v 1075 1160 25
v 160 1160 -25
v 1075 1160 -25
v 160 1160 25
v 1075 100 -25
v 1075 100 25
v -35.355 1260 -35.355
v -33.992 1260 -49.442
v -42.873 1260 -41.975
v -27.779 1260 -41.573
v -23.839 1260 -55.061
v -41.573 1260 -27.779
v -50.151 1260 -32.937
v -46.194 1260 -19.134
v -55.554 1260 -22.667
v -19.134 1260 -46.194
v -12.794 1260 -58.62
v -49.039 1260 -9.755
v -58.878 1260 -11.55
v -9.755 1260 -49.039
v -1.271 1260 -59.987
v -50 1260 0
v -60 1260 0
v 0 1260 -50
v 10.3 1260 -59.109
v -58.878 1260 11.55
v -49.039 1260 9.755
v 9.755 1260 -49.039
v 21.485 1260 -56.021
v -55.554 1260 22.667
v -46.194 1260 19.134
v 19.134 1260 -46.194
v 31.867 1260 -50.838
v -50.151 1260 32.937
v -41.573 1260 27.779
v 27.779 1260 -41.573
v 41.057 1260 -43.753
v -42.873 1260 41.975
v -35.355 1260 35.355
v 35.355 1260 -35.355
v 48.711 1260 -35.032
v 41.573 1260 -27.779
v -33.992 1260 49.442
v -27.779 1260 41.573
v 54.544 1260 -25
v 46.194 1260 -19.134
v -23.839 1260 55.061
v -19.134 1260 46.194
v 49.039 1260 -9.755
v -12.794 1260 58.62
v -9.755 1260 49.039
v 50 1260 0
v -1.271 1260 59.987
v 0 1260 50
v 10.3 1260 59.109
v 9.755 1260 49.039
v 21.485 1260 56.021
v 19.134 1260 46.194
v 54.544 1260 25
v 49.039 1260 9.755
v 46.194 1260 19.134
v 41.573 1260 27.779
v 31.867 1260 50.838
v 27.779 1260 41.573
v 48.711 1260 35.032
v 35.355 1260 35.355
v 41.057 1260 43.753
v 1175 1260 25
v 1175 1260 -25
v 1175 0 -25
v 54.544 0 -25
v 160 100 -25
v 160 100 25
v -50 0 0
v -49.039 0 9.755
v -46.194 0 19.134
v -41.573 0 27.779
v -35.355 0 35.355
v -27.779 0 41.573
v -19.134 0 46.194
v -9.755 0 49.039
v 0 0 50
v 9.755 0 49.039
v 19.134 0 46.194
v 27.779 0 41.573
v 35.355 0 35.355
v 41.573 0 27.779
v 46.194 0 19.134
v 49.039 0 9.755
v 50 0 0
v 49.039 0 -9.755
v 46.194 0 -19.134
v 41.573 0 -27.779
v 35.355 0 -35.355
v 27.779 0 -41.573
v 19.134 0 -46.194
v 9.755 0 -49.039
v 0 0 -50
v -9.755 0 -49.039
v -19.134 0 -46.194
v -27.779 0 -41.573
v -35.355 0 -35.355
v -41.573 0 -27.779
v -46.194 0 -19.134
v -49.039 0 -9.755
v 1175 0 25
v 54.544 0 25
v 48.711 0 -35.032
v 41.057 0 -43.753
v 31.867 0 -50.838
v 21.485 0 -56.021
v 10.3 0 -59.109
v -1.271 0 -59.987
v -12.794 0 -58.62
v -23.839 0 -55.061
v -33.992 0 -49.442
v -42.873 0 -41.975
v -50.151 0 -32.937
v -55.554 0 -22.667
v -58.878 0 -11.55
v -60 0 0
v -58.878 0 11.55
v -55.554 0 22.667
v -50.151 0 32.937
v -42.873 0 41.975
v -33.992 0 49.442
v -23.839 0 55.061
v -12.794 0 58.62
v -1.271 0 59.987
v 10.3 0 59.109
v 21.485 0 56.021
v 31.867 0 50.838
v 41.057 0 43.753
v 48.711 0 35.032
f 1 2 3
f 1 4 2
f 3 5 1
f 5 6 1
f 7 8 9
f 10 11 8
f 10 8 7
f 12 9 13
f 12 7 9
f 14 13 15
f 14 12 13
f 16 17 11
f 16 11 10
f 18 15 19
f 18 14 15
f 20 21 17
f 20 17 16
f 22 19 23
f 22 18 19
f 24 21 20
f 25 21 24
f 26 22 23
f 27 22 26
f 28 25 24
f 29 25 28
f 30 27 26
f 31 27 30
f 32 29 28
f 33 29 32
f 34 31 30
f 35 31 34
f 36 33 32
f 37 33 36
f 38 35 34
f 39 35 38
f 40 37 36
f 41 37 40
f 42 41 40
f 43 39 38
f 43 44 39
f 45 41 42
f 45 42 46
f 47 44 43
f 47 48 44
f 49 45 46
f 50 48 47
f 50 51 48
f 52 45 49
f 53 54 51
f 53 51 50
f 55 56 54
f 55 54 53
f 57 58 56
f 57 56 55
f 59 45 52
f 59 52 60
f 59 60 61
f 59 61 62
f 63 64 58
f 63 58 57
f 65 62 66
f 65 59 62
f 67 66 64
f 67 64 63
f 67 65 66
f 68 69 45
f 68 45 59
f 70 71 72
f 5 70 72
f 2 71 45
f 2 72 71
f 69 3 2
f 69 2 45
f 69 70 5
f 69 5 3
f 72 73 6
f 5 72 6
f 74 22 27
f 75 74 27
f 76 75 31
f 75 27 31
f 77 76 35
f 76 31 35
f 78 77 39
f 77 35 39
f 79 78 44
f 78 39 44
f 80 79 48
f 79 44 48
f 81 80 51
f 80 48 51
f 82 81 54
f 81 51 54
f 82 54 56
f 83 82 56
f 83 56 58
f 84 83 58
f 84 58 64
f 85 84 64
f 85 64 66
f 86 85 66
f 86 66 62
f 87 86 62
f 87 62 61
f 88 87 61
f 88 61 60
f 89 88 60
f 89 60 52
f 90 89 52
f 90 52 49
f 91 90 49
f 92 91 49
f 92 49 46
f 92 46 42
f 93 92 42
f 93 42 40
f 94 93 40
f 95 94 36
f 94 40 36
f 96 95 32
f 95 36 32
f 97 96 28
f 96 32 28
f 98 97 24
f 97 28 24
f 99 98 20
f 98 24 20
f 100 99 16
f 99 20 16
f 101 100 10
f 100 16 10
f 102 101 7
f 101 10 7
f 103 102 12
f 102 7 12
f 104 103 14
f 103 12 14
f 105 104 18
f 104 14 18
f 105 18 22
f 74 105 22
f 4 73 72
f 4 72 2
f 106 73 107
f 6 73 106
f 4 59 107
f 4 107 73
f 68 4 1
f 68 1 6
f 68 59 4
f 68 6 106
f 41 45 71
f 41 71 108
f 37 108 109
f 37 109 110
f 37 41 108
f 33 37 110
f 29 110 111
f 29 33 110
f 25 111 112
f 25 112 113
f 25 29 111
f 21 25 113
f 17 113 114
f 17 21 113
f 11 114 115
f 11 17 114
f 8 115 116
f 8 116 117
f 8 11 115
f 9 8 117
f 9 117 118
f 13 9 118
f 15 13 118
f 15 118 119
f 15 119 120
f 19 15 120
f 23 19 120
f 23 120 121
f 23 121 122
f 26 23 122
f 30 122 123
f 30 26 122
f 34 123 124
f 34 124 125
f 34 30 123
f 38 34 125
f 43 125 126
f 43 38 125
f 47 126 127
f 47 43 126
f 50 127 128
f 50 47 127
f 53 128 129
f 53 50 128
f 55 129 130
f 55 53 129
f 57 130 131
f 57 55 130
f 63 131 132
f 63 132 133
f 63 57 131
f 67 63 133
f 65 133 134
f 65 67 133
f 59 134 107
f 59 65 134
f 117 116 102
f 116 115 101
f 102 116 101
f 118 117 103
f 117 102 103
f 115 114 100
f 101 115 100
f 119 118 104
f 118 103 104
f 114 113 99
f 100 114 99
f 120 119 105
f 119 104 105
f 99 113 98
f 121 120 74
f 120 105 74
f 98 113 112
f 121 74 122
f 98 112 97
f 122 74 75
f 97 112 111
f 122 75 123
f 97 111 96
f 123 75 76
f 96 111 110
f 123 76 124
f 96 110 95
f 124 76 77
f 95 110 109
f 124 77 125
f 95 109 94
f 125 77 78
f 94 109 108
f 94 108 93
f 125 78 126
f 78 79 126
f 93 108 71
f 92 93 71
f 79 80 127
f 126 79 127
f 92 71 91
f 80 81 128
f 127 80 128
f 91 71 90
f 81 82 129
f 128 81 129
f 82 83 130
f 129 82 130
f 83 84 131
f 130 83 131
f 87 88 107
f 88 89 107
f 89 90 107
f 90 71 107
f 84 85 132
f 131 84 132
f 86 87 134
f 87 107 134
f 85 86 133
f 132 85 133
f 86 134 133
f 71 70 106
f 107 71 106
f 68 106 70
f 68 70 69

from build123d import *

# Parameters (mm, degrees)
SKETCH1_W           = 10
SKETCH1_H           = 1260
SKETCH2_W           = 1115
SKETCH2_H           = 1260
SKETCH2_W_2         = 915
SKETCH2_H_2         = 1060
BOSS_EXTRUDE1_DEPTH = 25
SKETCH3_W           = 50
SKETCH3_H           = 1260
BOSS_EXTRUDE2_DEPTH = 10


with BuildPart() as part:
    # Sketch1 → Revolve1 (revolve)
    with BuildSketch(Plane.XY):
        with Locations((-55, 630)):
            Rectangle(SKETCH1_W, SKETCH1_H)
    revolve(axis=Axis((0, 0, 0), (0, 1, 0)))



with BuildPart() as body_2:
    # Sketch2 → Boss-Extrude1 (new body, symmetric)
    with BuildSketch(Plane.XY):
        with Locations((617.5, 630)):
            Rectangle(SKETCH2_W, SKETCH2_H)
        with Locations((617.5, 630)):
            Rectangle(SKETCH2_W_2, SKETCH2_H_2, mode=Mode.SUBTRACT)
    extrude(amount=BOSS_EXTRUDE1_DEPTH, both=True)


with BuildPart() as part_1:
    add(part.part)

    add(body_2.part)  # Boss-Extrude2 merges body 2
    # Sketch3 → Boss-Extrude2 (add)
    with BuildSketch(Plane.ZY.offset(-60)):
        with Locations((0, 630)):
            Rectangle(SKETCH3_W, SKETCH3_H)
    extrude(amount=BOSS_EXTRUDE2_DEPTH)


solid = part_1.part
